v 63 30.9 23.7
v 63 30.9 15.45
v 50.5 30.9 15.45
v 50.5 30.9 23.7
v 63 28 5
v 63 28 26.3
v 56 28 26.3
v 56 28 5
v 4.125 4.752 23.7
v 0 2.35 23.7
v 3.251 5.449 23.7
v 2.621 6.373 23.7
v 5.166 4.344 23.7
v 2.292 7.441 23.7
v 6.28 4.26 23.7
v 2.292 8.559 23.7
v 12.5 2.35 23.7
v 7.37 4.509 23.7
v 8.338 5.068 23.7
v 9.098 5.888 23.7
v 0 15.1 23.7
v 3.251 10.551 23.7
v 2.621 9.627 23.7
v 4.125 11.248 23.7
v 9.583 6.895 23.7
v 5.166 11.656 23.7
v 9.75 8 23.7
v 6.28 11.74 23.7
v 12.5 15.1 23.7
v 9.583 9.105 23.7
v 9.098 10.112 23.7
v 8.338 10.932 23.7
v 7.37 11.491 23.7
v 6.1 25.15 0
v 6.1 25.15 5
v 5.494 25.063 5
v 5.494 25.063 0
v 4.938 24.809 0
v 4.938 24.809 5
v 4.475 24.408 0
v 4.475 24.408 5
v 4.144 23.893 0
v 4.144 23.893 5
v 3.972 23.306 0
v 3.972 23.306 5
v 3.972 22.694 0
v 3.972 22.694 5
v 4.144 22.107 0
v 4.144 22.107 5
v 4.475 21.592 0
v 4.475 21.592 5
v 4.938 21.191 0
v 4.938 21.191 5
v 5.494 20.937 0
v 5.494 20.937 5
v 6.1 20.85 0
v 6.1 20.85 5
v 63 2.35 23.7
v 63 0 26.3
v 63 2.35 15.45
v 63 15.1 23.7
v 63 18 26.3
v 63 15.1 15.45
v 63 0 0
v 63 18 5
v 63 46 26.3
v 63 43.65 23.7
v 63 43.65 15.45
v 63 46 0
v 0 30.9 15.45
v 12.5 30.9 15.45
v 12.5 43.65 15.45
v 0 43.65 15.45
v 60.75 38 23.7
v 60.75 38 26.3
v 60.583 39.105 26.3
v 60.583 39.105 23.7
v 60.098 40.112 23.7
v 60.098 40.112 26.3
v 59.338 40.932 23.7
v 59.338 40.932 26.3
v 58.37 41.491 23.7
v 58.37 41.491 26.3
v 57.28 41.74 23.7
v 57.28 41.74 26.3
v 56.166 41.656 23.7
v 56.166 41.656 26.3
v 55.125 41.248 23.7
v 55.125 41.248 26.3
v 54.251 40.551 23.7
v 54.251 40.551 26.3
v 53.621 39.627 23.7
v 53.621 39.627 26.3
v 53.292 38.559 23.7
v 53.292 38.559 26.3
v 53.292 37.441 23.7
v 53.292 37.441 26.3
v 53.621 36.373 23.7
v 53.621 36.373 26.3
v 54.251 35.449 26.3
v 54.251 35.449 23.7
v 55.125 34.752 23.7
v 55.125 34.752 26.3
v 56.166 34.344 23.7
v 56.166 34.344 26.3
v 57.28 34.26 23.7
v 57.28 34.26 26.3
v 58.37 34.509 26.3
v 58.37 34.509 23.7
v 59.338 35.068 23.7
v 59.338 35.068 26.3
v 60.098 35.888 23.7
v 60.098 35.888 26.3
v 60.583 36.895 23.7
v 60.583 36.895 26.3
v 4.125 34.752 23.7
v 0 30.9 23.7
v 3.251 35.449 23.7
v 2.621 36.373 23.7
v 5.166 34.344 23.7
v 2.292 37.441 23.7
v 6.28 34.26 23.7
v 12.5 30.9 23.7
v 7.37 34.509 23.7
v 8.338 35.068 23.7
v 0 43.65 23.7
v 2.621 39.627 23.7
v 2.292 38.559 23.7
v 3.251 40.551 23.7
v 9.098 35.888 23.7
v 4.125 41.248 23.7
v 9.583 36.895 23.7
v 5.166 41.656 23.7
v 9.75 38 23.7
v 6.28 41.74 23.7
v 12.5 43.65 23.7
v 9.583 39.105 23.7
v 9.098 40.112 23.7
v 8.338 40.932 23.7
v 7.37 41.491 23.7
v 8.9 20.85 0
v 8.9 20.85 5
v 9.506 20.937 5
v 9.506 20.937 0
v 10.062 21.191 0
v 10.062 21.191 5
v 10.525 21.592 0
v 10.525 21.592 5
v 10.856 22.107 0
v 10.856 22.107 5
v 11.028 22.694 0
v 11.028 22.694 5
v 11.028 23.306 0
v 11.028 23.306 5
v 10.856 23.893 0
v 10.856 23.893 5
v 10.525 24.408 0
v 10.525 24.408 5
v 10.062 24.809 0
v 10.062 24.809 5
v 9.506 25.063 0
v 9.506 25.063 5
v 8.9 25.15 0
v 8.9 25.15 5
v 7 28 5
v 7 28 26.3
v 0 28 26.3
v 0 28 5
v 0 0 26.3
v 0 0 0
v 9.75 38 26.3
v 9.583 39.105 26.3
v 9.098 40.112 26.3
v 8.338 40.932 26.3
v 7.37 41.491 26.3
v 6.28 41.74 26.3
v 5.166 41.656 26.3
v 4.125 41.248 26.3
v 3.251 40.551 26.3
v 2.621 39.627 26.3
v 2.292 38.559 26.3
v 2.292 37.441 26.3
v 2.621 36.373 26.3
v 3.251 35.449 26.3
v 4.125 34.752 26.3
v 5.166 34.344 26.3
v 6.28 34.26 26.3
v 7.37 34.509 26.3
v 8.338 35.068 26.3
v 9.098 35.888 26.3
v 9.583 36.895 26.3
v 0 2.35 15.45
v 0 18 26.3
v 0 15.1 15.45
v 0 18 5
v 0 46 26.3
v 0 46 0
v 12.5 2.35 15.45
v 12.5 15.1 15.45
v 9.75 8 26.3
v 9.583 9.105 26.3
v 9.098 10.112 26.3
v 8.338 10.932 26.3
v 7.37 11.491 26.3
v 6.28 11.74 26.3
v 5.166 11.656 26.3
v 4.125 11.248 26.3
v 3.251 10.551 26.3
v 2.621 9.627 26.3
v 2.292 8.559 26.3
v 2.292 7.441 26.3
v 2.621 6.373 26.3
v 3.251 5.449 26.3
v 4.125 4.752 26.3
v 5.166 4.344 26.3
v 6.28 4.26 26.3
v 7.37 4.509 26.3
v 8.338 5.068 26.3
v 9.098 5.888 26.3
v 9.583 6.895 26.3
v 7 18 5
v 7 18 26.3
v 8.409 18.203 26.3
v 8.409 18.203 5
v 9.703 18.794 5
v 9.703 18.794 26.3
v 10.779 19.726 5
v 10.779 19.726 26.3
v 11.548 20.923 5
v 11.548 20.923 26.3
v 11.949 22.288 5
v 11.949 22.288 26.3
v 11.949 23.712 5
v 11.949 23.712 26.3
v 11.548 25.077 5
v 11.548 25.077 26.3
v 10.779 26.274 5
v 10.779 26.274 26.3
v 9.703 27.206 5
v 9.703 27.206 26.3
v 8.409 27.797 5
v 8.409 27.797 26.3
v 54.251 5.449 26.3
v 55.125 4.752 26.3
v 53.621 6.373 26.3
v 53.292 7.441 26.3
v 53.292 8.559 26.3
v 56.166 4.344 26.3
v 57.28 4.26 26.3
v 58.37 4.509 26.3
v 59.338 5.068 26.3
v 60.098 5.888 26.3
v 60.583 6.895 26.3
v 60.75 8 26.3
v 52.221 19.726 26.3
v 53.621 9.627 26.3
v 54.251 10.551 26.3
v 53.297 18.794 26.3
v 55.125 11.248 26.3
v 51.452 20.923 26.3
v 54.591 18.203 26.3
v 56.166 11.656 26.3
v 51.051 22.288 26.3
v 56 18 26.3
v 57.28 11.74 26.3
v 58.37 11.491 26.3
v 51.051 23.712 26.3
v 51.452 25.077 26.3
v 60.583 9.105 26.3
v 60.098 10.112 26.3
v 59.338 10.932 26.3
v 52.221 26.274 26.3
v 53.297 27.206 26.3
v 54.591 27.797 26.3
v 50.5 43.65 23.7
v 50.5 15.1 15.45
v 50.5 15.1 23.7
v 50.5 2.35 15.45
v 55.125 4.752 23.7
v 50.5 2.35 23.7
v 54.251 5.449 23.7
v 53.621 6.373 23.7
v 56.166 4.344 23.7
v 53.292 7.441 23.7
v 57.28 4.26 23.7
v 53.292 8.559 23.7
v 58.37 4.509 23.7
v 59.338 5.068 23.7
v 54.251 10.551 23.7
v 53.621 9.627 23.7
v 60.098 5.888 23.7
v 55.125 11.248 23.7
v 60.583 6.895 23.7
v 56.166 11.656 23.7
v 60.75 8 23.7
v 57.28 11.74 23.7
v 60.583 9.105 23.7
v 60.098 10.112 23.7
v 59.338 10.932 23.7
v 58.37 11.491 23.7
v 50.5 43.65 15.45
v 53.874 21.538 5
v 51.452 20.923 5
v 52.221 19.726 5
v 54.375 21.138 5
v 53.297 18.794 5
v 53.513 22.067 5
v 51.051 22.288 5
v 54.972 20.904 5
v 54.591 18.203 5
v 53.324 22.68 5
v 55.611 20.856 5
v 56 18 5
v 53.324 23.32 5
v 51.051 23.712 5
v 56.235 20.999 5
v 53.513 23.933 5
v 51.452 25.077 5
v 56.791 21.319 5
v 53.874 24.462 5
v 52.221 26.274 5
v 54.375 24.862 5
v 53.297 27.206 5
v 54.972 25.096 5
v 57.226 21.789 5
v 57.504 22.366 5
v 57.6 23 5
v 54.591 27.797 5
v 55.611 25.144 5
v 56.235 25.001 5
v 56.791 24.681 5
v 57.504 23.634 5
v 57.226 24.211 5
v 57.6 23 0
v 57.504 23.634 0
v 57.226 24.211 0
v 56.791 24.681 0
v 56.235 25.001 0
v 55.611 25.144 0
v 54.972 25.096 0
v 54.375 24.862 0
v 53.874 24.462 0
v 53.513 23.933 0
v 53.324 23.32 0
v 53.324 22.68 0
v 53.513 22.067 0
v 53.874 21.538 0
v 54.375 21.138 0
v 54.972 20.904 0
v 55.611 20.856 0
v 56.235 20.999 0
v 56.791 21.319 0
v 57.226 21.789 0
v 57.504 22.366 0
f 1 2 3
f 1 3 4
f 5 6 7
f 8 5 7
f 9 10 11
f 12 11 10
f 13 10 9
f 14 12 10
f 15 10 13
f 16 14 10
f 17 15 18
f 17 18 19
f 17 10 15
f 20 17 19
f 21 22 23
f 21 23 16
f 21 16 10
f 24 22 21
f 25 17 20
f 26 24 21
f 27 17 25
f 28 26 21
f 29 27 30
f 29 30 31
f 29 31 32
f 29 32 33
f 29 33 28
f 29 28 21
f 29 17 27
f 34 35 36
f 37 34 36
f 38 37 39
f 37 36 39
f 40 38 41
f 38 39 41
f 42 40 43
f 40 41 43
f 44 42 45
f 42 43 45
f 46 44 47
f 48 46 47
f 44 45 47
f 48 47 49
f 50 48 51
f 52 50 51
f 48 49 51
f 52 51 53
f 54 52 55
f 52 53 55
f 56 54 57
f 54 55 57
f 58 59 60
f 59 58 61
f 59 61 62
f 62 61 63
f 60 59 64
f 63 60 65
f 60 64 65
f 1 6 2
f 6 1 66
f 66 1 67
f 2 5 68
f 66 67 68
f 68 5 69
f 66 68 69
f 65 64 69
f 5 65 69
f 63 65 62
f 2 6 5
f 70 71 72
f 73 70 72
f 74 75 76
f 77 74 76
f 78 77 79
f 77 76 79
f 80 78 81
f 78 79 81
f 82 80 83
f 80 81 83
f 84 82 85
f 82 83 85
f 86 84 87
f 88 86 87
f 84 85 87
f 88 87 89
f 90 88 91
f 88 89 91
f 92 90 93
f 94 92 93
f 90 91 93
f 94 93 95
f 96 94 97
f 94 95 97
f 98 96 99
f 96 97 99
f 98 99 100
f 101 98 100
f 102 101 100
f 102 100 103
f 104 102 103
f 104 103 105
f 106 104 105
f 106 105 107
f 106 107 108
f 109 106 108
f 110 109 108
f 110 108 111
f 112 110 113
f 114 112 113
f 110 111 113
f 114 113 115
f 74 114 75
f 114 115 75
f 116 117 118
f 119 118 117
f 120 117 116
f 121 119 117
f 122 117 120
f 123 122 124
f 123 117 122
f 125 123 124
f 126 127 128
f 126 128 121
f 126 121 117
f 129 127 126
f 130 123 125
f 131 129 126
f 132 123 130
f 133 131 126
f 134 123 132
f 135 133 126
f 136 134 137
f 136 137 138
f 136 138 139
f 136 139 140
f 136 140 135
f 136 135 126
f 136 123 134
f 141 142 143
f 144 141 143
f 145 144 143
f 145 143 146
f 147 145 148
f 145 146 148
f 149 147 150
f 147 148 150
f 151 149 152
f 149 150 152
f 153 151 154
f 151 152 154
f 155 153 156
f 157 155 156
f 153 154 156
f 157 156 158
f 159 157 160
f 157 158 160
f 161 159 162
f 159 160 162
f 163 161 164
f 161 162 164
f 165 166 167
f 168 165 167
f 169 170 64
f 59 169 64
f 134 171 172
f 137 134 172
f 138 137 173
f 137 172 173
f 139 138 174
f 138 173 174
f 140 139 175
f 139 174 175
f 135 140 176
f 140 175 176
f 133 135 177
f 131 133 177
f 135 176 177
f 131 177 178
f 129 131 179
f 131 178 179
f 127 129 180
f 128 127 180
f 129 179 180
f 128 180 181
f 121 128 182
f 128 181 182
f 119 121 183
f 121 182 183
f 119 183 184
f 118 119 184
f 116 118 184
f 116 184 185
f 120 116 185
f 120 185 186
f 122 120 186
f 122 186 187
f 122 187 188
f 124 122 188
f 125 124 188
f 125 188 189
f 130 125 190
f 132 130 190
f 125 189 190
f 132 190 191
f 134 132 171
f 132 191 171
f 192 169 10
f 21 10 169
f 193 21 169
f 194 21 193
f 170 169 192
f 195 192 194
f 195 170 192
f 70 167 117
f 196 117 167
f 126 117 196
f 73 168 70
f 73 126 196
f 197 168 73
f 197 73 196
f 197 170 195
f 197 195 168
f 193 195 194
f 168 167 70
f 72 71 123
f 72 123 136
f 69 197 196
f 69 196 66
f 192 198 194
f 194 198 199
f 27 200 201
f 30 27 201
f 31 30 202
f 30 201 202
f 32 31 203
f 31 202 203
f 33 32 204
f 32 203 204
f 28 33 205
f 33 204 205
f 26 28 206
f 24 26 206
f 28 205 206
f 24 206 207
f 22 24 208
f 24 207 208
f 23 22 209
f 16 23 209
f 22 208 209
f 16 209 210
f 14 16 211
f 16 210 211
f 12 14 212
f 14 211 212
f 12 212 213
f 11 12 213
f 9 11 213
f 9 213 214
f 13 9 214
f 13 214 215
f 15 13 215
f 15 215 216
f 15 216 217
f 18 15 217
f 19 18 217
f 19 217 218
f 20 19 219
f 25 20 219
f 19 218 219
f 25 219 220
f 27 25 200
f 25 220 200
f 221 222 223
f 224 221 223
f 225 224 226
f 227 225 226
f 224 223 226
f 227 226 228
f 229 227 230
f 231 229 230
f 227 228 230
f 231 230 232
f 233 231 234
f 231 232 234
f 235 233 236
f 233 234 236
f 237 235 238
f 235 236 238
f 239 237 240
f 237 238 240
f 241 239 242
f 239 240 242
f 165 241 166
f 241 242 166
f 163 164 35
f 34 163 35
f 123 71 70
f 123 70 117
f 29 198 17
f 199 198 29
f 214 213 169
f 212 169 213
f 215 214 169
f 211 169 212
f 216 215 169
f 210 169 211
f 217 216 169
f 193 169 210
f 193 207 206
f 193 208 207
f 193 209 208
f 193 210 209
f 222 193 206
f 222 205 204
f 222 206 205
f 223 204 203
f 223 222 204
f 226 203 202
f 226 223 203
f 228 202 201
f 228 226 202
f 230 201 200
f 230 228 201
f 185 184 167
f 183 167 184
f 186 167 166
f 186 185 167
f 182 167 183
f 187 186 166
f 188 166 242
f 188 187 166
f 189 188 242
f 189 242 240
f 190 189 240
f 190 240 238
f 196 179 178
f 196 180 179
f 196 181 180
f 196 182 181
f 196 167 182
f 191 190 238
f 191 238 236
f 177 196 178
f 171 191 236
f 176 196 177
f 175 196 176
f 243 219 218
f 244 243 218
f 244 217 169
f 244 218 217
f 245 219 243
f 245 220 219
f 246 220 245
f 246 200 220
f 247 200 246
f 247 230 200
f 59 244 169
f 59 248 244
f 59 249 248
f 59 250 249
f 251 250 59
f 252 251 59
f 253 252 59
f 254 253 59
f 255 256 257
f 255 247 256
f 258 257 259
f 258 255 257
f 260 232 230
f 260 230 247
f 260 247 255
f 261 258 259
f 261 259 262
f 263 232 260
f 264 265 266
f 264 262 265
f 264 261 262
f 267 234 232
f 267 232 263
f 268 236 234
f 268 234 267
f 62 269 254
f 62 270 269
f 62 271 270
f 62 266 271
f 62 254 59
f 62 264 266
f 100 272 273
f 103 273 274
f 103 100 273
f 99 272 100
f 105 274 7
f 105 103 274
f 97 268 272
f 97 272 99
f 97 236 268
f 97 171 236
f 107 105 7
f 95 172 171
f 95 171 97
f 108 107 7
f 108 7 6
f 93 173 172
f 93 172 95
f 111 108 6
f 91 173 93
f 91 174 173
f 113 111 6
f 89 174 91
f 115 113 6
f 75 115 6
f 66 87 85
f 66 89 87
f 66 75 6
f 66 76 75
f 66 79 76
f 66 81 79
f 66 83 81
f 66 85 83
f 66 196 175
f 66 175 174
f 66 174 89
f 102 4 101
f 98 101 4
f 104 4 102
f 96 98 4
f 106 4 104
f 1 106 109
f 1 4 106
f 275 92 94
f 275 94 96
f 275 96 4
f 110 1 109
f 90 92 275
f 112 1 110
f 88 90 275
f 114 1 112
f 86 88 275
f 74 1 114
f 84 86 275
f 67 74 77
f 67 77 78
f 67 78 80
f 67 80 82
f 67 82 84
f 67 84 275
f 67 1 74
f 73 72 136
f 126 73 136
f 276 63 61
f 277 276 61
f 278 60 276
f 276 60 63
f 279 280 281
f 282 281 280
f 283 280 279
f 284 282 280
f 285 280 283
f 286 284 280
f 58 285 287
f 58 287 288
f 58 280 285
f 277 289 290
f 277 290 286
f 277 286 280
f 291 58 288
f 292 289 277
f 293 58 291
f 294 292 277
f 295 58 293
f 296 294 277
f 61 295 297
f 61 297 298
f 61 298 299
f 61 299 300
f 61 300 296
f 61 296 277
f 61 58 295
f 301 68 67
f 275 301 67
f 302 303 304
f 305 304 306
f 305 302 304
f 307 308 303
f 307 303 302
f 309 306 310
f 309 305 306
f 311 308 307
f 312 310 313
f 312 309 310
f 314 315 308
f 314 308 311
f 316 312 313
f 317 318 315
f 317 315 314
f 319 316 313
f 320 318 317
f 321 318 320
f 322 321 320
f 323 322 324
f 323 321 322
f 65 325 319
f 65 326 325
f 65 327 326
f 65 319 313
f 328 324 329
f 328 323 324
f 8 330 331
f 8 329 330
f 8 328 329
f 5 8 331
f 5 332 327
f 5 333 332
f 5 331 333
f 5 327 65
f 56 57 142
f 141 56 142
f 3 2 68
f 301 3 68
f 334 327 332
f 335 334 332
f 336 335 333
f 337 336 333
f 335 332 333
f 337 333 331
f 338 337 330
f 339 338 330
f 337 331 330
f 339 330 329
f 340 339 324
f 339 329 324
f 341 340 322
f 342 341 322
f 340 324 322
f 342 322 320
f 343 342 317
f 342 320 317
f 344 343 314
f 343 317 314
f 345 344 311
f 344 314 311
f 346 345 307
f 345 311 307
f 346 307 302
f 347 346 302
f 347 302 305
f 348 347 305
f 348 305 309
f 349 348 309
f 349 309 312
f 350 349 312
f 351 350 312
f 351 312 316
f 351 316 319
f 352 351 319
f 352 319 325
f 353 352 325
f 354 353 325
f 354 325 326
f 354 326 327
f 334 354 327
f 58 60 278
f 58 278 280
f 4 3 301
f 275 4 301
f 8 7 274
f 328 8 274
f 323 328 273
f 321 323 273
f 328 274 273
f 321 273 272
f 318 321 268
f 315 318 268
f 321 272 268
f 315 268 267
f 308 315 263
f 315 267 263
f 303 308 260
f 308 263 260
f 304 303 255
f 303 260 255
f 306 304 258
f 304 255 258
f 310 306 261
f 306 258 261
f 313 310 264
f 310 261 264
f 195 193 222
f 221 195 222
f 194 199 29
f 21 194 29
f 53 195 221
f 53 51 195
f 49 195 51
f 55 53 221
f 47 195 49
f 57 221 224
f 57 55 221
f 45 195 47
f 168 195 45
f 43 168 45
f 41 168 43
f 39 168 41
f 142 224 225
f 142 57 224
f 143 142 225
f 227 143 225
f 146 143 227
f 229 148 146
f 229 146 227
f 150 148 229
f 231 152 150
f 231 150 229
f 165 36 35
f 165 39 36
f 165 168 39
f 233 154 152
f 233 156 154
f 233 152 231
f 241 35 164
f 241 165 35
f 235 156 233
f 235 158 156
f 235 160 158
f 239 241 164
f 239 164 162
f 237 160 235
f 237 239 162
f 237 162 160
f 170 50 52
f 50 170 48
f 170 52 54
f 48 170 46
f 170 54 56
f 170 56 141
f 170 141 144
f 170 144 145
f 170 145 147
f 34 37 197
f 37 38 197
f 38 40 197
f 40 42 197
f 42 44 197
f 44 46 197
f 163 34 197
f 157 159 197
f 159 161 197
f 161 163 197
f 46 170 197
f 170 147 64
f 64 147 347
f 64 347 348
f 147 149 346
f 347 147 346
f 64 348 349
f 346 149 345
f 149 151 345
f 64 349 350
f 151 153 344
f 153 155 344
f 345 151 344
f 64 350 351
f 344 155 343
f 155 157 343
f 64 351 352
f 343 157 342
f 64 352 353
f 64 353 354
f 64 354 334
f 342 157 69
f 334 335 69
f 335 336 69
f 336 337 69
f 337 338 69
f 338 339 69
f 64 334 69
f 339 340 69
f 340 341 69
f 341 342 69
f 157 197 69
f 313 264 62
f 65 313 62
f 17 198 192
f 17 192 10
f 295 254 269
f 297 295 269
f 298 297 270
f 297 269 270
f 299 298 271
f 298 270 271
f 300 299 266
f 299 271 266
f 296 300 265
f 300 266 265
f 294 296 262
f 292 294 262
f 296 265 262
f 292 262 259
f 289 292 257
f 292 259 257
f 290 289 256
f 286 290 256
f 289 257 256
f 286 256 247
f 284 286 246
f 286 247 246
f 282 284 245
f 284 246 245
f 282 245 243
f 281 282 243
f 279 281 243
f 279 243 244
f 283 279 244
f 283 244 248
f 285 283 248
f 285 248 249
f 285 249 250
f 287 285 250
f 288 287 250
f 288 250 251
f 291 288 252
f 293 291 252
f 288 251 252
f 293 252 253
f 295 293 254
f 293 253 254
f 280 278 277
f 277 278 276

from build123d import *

# Parameters (mm, degrees)
F0_W      = 63
F0_H      = 46
F1_DEPTH  = 26.3
F3_DEPTH  = 21.3
F4_R      = 2.15
F5_DEPTH  = 5.001
F6_W      = 12.75
F6_H      = 8.25
F7_DEPTH  = 63.001
F8_W      = 38
F8_H      = 46
F9_DEPTH  = 26.3
F10_R     = 3.75
F11_DEPTH = 2.6


with BuildPart() as f1:
    # F0 (on Top) → F1 (new body)
    with BuildSketch(Plane.XY):
        with Locations((31.5, 23)):
            Rectangle(F0_W, F0_H)
    extrude(amount=F1_DEPTH)

    # F2 (on face) → F3 (cut)
    with BuildSketch(Plane.XY.offset(26.3)):
        with BuildLine():
            Line((7, 28), (0, 28))
            Line((0, 28), (0, 18))
            Line((0, 18), (7, 18))
            ThreePointArc((7, 18), (12, 23), (7, 28))
        make_face()
        with BuildLine():
            Line((63, 18), (63, 28))
            Line((63, 28), (56, 28))
            ThreePointArc((56, 28), (51, 23), (56, 18))
            Line((56, 18), (63, 18))
        make_face()
    extrude(amount=-F3_DEPTH, mode=Mode.SUBTRACT)

    # F4 (on face) → F5 (cut, through all)
    with BuildSketch(Plane.XY.offset(5)):
        with BuildLine():
            Line((8.9, 25.15), (6.1, 25.15))
            ThreePointArc((6.1, 25.15), (3.95, 23), (6.1, 20.85))
            Line((6.1, 20.85), (8.9, 20.85))
            ThreePointArc((8.9, 20.85), (11.05, 23), (8.9, 25.15))
        make_face()
        with Locations((55.45, 23)):
            Circle(F4_R)
    extrude(amount=-F5_DEPTH, mode=Mode.SUBTRACT)

    # F6 (on face) → F7 (cut, through all)
    with BuildSketch(Plane.YZ.offset(63)):
        with Locations((37.275, 19.575)):
            Rectangle(F6_W, F6_H)
        with Locations((8.725, 19.575)):
            Rectangle(F6_W, F6_H)
    extrude(amount=-F7_DEPTH, mode=Mode.SUBTRACT)

    # F8 (on Top) → F9 (join, through all)
    with BuildSketch(Plane.XY):
        with Locations((31.5, 23)):
            Rectangle(F8_W, F8_H)
    extrude(amount=F9_DEPTH)

    # F10 (on face) → F11 (cut, through all)
    with BuildSketch(Plane.XY.offset(26.3)):
        with Locations((6, 38)):
            Circle(F10_R)
        with Locations((6, 8)):
            Circle(F10_R)
        with Locations((57, 38)):
            Circle(F10_R)
        with Locations((57, 8)):
            Circle(F10_R)
    extrude(amount=-F11_DEPTH, mode=Mode.SUBTRACT)


solid = f1.part
